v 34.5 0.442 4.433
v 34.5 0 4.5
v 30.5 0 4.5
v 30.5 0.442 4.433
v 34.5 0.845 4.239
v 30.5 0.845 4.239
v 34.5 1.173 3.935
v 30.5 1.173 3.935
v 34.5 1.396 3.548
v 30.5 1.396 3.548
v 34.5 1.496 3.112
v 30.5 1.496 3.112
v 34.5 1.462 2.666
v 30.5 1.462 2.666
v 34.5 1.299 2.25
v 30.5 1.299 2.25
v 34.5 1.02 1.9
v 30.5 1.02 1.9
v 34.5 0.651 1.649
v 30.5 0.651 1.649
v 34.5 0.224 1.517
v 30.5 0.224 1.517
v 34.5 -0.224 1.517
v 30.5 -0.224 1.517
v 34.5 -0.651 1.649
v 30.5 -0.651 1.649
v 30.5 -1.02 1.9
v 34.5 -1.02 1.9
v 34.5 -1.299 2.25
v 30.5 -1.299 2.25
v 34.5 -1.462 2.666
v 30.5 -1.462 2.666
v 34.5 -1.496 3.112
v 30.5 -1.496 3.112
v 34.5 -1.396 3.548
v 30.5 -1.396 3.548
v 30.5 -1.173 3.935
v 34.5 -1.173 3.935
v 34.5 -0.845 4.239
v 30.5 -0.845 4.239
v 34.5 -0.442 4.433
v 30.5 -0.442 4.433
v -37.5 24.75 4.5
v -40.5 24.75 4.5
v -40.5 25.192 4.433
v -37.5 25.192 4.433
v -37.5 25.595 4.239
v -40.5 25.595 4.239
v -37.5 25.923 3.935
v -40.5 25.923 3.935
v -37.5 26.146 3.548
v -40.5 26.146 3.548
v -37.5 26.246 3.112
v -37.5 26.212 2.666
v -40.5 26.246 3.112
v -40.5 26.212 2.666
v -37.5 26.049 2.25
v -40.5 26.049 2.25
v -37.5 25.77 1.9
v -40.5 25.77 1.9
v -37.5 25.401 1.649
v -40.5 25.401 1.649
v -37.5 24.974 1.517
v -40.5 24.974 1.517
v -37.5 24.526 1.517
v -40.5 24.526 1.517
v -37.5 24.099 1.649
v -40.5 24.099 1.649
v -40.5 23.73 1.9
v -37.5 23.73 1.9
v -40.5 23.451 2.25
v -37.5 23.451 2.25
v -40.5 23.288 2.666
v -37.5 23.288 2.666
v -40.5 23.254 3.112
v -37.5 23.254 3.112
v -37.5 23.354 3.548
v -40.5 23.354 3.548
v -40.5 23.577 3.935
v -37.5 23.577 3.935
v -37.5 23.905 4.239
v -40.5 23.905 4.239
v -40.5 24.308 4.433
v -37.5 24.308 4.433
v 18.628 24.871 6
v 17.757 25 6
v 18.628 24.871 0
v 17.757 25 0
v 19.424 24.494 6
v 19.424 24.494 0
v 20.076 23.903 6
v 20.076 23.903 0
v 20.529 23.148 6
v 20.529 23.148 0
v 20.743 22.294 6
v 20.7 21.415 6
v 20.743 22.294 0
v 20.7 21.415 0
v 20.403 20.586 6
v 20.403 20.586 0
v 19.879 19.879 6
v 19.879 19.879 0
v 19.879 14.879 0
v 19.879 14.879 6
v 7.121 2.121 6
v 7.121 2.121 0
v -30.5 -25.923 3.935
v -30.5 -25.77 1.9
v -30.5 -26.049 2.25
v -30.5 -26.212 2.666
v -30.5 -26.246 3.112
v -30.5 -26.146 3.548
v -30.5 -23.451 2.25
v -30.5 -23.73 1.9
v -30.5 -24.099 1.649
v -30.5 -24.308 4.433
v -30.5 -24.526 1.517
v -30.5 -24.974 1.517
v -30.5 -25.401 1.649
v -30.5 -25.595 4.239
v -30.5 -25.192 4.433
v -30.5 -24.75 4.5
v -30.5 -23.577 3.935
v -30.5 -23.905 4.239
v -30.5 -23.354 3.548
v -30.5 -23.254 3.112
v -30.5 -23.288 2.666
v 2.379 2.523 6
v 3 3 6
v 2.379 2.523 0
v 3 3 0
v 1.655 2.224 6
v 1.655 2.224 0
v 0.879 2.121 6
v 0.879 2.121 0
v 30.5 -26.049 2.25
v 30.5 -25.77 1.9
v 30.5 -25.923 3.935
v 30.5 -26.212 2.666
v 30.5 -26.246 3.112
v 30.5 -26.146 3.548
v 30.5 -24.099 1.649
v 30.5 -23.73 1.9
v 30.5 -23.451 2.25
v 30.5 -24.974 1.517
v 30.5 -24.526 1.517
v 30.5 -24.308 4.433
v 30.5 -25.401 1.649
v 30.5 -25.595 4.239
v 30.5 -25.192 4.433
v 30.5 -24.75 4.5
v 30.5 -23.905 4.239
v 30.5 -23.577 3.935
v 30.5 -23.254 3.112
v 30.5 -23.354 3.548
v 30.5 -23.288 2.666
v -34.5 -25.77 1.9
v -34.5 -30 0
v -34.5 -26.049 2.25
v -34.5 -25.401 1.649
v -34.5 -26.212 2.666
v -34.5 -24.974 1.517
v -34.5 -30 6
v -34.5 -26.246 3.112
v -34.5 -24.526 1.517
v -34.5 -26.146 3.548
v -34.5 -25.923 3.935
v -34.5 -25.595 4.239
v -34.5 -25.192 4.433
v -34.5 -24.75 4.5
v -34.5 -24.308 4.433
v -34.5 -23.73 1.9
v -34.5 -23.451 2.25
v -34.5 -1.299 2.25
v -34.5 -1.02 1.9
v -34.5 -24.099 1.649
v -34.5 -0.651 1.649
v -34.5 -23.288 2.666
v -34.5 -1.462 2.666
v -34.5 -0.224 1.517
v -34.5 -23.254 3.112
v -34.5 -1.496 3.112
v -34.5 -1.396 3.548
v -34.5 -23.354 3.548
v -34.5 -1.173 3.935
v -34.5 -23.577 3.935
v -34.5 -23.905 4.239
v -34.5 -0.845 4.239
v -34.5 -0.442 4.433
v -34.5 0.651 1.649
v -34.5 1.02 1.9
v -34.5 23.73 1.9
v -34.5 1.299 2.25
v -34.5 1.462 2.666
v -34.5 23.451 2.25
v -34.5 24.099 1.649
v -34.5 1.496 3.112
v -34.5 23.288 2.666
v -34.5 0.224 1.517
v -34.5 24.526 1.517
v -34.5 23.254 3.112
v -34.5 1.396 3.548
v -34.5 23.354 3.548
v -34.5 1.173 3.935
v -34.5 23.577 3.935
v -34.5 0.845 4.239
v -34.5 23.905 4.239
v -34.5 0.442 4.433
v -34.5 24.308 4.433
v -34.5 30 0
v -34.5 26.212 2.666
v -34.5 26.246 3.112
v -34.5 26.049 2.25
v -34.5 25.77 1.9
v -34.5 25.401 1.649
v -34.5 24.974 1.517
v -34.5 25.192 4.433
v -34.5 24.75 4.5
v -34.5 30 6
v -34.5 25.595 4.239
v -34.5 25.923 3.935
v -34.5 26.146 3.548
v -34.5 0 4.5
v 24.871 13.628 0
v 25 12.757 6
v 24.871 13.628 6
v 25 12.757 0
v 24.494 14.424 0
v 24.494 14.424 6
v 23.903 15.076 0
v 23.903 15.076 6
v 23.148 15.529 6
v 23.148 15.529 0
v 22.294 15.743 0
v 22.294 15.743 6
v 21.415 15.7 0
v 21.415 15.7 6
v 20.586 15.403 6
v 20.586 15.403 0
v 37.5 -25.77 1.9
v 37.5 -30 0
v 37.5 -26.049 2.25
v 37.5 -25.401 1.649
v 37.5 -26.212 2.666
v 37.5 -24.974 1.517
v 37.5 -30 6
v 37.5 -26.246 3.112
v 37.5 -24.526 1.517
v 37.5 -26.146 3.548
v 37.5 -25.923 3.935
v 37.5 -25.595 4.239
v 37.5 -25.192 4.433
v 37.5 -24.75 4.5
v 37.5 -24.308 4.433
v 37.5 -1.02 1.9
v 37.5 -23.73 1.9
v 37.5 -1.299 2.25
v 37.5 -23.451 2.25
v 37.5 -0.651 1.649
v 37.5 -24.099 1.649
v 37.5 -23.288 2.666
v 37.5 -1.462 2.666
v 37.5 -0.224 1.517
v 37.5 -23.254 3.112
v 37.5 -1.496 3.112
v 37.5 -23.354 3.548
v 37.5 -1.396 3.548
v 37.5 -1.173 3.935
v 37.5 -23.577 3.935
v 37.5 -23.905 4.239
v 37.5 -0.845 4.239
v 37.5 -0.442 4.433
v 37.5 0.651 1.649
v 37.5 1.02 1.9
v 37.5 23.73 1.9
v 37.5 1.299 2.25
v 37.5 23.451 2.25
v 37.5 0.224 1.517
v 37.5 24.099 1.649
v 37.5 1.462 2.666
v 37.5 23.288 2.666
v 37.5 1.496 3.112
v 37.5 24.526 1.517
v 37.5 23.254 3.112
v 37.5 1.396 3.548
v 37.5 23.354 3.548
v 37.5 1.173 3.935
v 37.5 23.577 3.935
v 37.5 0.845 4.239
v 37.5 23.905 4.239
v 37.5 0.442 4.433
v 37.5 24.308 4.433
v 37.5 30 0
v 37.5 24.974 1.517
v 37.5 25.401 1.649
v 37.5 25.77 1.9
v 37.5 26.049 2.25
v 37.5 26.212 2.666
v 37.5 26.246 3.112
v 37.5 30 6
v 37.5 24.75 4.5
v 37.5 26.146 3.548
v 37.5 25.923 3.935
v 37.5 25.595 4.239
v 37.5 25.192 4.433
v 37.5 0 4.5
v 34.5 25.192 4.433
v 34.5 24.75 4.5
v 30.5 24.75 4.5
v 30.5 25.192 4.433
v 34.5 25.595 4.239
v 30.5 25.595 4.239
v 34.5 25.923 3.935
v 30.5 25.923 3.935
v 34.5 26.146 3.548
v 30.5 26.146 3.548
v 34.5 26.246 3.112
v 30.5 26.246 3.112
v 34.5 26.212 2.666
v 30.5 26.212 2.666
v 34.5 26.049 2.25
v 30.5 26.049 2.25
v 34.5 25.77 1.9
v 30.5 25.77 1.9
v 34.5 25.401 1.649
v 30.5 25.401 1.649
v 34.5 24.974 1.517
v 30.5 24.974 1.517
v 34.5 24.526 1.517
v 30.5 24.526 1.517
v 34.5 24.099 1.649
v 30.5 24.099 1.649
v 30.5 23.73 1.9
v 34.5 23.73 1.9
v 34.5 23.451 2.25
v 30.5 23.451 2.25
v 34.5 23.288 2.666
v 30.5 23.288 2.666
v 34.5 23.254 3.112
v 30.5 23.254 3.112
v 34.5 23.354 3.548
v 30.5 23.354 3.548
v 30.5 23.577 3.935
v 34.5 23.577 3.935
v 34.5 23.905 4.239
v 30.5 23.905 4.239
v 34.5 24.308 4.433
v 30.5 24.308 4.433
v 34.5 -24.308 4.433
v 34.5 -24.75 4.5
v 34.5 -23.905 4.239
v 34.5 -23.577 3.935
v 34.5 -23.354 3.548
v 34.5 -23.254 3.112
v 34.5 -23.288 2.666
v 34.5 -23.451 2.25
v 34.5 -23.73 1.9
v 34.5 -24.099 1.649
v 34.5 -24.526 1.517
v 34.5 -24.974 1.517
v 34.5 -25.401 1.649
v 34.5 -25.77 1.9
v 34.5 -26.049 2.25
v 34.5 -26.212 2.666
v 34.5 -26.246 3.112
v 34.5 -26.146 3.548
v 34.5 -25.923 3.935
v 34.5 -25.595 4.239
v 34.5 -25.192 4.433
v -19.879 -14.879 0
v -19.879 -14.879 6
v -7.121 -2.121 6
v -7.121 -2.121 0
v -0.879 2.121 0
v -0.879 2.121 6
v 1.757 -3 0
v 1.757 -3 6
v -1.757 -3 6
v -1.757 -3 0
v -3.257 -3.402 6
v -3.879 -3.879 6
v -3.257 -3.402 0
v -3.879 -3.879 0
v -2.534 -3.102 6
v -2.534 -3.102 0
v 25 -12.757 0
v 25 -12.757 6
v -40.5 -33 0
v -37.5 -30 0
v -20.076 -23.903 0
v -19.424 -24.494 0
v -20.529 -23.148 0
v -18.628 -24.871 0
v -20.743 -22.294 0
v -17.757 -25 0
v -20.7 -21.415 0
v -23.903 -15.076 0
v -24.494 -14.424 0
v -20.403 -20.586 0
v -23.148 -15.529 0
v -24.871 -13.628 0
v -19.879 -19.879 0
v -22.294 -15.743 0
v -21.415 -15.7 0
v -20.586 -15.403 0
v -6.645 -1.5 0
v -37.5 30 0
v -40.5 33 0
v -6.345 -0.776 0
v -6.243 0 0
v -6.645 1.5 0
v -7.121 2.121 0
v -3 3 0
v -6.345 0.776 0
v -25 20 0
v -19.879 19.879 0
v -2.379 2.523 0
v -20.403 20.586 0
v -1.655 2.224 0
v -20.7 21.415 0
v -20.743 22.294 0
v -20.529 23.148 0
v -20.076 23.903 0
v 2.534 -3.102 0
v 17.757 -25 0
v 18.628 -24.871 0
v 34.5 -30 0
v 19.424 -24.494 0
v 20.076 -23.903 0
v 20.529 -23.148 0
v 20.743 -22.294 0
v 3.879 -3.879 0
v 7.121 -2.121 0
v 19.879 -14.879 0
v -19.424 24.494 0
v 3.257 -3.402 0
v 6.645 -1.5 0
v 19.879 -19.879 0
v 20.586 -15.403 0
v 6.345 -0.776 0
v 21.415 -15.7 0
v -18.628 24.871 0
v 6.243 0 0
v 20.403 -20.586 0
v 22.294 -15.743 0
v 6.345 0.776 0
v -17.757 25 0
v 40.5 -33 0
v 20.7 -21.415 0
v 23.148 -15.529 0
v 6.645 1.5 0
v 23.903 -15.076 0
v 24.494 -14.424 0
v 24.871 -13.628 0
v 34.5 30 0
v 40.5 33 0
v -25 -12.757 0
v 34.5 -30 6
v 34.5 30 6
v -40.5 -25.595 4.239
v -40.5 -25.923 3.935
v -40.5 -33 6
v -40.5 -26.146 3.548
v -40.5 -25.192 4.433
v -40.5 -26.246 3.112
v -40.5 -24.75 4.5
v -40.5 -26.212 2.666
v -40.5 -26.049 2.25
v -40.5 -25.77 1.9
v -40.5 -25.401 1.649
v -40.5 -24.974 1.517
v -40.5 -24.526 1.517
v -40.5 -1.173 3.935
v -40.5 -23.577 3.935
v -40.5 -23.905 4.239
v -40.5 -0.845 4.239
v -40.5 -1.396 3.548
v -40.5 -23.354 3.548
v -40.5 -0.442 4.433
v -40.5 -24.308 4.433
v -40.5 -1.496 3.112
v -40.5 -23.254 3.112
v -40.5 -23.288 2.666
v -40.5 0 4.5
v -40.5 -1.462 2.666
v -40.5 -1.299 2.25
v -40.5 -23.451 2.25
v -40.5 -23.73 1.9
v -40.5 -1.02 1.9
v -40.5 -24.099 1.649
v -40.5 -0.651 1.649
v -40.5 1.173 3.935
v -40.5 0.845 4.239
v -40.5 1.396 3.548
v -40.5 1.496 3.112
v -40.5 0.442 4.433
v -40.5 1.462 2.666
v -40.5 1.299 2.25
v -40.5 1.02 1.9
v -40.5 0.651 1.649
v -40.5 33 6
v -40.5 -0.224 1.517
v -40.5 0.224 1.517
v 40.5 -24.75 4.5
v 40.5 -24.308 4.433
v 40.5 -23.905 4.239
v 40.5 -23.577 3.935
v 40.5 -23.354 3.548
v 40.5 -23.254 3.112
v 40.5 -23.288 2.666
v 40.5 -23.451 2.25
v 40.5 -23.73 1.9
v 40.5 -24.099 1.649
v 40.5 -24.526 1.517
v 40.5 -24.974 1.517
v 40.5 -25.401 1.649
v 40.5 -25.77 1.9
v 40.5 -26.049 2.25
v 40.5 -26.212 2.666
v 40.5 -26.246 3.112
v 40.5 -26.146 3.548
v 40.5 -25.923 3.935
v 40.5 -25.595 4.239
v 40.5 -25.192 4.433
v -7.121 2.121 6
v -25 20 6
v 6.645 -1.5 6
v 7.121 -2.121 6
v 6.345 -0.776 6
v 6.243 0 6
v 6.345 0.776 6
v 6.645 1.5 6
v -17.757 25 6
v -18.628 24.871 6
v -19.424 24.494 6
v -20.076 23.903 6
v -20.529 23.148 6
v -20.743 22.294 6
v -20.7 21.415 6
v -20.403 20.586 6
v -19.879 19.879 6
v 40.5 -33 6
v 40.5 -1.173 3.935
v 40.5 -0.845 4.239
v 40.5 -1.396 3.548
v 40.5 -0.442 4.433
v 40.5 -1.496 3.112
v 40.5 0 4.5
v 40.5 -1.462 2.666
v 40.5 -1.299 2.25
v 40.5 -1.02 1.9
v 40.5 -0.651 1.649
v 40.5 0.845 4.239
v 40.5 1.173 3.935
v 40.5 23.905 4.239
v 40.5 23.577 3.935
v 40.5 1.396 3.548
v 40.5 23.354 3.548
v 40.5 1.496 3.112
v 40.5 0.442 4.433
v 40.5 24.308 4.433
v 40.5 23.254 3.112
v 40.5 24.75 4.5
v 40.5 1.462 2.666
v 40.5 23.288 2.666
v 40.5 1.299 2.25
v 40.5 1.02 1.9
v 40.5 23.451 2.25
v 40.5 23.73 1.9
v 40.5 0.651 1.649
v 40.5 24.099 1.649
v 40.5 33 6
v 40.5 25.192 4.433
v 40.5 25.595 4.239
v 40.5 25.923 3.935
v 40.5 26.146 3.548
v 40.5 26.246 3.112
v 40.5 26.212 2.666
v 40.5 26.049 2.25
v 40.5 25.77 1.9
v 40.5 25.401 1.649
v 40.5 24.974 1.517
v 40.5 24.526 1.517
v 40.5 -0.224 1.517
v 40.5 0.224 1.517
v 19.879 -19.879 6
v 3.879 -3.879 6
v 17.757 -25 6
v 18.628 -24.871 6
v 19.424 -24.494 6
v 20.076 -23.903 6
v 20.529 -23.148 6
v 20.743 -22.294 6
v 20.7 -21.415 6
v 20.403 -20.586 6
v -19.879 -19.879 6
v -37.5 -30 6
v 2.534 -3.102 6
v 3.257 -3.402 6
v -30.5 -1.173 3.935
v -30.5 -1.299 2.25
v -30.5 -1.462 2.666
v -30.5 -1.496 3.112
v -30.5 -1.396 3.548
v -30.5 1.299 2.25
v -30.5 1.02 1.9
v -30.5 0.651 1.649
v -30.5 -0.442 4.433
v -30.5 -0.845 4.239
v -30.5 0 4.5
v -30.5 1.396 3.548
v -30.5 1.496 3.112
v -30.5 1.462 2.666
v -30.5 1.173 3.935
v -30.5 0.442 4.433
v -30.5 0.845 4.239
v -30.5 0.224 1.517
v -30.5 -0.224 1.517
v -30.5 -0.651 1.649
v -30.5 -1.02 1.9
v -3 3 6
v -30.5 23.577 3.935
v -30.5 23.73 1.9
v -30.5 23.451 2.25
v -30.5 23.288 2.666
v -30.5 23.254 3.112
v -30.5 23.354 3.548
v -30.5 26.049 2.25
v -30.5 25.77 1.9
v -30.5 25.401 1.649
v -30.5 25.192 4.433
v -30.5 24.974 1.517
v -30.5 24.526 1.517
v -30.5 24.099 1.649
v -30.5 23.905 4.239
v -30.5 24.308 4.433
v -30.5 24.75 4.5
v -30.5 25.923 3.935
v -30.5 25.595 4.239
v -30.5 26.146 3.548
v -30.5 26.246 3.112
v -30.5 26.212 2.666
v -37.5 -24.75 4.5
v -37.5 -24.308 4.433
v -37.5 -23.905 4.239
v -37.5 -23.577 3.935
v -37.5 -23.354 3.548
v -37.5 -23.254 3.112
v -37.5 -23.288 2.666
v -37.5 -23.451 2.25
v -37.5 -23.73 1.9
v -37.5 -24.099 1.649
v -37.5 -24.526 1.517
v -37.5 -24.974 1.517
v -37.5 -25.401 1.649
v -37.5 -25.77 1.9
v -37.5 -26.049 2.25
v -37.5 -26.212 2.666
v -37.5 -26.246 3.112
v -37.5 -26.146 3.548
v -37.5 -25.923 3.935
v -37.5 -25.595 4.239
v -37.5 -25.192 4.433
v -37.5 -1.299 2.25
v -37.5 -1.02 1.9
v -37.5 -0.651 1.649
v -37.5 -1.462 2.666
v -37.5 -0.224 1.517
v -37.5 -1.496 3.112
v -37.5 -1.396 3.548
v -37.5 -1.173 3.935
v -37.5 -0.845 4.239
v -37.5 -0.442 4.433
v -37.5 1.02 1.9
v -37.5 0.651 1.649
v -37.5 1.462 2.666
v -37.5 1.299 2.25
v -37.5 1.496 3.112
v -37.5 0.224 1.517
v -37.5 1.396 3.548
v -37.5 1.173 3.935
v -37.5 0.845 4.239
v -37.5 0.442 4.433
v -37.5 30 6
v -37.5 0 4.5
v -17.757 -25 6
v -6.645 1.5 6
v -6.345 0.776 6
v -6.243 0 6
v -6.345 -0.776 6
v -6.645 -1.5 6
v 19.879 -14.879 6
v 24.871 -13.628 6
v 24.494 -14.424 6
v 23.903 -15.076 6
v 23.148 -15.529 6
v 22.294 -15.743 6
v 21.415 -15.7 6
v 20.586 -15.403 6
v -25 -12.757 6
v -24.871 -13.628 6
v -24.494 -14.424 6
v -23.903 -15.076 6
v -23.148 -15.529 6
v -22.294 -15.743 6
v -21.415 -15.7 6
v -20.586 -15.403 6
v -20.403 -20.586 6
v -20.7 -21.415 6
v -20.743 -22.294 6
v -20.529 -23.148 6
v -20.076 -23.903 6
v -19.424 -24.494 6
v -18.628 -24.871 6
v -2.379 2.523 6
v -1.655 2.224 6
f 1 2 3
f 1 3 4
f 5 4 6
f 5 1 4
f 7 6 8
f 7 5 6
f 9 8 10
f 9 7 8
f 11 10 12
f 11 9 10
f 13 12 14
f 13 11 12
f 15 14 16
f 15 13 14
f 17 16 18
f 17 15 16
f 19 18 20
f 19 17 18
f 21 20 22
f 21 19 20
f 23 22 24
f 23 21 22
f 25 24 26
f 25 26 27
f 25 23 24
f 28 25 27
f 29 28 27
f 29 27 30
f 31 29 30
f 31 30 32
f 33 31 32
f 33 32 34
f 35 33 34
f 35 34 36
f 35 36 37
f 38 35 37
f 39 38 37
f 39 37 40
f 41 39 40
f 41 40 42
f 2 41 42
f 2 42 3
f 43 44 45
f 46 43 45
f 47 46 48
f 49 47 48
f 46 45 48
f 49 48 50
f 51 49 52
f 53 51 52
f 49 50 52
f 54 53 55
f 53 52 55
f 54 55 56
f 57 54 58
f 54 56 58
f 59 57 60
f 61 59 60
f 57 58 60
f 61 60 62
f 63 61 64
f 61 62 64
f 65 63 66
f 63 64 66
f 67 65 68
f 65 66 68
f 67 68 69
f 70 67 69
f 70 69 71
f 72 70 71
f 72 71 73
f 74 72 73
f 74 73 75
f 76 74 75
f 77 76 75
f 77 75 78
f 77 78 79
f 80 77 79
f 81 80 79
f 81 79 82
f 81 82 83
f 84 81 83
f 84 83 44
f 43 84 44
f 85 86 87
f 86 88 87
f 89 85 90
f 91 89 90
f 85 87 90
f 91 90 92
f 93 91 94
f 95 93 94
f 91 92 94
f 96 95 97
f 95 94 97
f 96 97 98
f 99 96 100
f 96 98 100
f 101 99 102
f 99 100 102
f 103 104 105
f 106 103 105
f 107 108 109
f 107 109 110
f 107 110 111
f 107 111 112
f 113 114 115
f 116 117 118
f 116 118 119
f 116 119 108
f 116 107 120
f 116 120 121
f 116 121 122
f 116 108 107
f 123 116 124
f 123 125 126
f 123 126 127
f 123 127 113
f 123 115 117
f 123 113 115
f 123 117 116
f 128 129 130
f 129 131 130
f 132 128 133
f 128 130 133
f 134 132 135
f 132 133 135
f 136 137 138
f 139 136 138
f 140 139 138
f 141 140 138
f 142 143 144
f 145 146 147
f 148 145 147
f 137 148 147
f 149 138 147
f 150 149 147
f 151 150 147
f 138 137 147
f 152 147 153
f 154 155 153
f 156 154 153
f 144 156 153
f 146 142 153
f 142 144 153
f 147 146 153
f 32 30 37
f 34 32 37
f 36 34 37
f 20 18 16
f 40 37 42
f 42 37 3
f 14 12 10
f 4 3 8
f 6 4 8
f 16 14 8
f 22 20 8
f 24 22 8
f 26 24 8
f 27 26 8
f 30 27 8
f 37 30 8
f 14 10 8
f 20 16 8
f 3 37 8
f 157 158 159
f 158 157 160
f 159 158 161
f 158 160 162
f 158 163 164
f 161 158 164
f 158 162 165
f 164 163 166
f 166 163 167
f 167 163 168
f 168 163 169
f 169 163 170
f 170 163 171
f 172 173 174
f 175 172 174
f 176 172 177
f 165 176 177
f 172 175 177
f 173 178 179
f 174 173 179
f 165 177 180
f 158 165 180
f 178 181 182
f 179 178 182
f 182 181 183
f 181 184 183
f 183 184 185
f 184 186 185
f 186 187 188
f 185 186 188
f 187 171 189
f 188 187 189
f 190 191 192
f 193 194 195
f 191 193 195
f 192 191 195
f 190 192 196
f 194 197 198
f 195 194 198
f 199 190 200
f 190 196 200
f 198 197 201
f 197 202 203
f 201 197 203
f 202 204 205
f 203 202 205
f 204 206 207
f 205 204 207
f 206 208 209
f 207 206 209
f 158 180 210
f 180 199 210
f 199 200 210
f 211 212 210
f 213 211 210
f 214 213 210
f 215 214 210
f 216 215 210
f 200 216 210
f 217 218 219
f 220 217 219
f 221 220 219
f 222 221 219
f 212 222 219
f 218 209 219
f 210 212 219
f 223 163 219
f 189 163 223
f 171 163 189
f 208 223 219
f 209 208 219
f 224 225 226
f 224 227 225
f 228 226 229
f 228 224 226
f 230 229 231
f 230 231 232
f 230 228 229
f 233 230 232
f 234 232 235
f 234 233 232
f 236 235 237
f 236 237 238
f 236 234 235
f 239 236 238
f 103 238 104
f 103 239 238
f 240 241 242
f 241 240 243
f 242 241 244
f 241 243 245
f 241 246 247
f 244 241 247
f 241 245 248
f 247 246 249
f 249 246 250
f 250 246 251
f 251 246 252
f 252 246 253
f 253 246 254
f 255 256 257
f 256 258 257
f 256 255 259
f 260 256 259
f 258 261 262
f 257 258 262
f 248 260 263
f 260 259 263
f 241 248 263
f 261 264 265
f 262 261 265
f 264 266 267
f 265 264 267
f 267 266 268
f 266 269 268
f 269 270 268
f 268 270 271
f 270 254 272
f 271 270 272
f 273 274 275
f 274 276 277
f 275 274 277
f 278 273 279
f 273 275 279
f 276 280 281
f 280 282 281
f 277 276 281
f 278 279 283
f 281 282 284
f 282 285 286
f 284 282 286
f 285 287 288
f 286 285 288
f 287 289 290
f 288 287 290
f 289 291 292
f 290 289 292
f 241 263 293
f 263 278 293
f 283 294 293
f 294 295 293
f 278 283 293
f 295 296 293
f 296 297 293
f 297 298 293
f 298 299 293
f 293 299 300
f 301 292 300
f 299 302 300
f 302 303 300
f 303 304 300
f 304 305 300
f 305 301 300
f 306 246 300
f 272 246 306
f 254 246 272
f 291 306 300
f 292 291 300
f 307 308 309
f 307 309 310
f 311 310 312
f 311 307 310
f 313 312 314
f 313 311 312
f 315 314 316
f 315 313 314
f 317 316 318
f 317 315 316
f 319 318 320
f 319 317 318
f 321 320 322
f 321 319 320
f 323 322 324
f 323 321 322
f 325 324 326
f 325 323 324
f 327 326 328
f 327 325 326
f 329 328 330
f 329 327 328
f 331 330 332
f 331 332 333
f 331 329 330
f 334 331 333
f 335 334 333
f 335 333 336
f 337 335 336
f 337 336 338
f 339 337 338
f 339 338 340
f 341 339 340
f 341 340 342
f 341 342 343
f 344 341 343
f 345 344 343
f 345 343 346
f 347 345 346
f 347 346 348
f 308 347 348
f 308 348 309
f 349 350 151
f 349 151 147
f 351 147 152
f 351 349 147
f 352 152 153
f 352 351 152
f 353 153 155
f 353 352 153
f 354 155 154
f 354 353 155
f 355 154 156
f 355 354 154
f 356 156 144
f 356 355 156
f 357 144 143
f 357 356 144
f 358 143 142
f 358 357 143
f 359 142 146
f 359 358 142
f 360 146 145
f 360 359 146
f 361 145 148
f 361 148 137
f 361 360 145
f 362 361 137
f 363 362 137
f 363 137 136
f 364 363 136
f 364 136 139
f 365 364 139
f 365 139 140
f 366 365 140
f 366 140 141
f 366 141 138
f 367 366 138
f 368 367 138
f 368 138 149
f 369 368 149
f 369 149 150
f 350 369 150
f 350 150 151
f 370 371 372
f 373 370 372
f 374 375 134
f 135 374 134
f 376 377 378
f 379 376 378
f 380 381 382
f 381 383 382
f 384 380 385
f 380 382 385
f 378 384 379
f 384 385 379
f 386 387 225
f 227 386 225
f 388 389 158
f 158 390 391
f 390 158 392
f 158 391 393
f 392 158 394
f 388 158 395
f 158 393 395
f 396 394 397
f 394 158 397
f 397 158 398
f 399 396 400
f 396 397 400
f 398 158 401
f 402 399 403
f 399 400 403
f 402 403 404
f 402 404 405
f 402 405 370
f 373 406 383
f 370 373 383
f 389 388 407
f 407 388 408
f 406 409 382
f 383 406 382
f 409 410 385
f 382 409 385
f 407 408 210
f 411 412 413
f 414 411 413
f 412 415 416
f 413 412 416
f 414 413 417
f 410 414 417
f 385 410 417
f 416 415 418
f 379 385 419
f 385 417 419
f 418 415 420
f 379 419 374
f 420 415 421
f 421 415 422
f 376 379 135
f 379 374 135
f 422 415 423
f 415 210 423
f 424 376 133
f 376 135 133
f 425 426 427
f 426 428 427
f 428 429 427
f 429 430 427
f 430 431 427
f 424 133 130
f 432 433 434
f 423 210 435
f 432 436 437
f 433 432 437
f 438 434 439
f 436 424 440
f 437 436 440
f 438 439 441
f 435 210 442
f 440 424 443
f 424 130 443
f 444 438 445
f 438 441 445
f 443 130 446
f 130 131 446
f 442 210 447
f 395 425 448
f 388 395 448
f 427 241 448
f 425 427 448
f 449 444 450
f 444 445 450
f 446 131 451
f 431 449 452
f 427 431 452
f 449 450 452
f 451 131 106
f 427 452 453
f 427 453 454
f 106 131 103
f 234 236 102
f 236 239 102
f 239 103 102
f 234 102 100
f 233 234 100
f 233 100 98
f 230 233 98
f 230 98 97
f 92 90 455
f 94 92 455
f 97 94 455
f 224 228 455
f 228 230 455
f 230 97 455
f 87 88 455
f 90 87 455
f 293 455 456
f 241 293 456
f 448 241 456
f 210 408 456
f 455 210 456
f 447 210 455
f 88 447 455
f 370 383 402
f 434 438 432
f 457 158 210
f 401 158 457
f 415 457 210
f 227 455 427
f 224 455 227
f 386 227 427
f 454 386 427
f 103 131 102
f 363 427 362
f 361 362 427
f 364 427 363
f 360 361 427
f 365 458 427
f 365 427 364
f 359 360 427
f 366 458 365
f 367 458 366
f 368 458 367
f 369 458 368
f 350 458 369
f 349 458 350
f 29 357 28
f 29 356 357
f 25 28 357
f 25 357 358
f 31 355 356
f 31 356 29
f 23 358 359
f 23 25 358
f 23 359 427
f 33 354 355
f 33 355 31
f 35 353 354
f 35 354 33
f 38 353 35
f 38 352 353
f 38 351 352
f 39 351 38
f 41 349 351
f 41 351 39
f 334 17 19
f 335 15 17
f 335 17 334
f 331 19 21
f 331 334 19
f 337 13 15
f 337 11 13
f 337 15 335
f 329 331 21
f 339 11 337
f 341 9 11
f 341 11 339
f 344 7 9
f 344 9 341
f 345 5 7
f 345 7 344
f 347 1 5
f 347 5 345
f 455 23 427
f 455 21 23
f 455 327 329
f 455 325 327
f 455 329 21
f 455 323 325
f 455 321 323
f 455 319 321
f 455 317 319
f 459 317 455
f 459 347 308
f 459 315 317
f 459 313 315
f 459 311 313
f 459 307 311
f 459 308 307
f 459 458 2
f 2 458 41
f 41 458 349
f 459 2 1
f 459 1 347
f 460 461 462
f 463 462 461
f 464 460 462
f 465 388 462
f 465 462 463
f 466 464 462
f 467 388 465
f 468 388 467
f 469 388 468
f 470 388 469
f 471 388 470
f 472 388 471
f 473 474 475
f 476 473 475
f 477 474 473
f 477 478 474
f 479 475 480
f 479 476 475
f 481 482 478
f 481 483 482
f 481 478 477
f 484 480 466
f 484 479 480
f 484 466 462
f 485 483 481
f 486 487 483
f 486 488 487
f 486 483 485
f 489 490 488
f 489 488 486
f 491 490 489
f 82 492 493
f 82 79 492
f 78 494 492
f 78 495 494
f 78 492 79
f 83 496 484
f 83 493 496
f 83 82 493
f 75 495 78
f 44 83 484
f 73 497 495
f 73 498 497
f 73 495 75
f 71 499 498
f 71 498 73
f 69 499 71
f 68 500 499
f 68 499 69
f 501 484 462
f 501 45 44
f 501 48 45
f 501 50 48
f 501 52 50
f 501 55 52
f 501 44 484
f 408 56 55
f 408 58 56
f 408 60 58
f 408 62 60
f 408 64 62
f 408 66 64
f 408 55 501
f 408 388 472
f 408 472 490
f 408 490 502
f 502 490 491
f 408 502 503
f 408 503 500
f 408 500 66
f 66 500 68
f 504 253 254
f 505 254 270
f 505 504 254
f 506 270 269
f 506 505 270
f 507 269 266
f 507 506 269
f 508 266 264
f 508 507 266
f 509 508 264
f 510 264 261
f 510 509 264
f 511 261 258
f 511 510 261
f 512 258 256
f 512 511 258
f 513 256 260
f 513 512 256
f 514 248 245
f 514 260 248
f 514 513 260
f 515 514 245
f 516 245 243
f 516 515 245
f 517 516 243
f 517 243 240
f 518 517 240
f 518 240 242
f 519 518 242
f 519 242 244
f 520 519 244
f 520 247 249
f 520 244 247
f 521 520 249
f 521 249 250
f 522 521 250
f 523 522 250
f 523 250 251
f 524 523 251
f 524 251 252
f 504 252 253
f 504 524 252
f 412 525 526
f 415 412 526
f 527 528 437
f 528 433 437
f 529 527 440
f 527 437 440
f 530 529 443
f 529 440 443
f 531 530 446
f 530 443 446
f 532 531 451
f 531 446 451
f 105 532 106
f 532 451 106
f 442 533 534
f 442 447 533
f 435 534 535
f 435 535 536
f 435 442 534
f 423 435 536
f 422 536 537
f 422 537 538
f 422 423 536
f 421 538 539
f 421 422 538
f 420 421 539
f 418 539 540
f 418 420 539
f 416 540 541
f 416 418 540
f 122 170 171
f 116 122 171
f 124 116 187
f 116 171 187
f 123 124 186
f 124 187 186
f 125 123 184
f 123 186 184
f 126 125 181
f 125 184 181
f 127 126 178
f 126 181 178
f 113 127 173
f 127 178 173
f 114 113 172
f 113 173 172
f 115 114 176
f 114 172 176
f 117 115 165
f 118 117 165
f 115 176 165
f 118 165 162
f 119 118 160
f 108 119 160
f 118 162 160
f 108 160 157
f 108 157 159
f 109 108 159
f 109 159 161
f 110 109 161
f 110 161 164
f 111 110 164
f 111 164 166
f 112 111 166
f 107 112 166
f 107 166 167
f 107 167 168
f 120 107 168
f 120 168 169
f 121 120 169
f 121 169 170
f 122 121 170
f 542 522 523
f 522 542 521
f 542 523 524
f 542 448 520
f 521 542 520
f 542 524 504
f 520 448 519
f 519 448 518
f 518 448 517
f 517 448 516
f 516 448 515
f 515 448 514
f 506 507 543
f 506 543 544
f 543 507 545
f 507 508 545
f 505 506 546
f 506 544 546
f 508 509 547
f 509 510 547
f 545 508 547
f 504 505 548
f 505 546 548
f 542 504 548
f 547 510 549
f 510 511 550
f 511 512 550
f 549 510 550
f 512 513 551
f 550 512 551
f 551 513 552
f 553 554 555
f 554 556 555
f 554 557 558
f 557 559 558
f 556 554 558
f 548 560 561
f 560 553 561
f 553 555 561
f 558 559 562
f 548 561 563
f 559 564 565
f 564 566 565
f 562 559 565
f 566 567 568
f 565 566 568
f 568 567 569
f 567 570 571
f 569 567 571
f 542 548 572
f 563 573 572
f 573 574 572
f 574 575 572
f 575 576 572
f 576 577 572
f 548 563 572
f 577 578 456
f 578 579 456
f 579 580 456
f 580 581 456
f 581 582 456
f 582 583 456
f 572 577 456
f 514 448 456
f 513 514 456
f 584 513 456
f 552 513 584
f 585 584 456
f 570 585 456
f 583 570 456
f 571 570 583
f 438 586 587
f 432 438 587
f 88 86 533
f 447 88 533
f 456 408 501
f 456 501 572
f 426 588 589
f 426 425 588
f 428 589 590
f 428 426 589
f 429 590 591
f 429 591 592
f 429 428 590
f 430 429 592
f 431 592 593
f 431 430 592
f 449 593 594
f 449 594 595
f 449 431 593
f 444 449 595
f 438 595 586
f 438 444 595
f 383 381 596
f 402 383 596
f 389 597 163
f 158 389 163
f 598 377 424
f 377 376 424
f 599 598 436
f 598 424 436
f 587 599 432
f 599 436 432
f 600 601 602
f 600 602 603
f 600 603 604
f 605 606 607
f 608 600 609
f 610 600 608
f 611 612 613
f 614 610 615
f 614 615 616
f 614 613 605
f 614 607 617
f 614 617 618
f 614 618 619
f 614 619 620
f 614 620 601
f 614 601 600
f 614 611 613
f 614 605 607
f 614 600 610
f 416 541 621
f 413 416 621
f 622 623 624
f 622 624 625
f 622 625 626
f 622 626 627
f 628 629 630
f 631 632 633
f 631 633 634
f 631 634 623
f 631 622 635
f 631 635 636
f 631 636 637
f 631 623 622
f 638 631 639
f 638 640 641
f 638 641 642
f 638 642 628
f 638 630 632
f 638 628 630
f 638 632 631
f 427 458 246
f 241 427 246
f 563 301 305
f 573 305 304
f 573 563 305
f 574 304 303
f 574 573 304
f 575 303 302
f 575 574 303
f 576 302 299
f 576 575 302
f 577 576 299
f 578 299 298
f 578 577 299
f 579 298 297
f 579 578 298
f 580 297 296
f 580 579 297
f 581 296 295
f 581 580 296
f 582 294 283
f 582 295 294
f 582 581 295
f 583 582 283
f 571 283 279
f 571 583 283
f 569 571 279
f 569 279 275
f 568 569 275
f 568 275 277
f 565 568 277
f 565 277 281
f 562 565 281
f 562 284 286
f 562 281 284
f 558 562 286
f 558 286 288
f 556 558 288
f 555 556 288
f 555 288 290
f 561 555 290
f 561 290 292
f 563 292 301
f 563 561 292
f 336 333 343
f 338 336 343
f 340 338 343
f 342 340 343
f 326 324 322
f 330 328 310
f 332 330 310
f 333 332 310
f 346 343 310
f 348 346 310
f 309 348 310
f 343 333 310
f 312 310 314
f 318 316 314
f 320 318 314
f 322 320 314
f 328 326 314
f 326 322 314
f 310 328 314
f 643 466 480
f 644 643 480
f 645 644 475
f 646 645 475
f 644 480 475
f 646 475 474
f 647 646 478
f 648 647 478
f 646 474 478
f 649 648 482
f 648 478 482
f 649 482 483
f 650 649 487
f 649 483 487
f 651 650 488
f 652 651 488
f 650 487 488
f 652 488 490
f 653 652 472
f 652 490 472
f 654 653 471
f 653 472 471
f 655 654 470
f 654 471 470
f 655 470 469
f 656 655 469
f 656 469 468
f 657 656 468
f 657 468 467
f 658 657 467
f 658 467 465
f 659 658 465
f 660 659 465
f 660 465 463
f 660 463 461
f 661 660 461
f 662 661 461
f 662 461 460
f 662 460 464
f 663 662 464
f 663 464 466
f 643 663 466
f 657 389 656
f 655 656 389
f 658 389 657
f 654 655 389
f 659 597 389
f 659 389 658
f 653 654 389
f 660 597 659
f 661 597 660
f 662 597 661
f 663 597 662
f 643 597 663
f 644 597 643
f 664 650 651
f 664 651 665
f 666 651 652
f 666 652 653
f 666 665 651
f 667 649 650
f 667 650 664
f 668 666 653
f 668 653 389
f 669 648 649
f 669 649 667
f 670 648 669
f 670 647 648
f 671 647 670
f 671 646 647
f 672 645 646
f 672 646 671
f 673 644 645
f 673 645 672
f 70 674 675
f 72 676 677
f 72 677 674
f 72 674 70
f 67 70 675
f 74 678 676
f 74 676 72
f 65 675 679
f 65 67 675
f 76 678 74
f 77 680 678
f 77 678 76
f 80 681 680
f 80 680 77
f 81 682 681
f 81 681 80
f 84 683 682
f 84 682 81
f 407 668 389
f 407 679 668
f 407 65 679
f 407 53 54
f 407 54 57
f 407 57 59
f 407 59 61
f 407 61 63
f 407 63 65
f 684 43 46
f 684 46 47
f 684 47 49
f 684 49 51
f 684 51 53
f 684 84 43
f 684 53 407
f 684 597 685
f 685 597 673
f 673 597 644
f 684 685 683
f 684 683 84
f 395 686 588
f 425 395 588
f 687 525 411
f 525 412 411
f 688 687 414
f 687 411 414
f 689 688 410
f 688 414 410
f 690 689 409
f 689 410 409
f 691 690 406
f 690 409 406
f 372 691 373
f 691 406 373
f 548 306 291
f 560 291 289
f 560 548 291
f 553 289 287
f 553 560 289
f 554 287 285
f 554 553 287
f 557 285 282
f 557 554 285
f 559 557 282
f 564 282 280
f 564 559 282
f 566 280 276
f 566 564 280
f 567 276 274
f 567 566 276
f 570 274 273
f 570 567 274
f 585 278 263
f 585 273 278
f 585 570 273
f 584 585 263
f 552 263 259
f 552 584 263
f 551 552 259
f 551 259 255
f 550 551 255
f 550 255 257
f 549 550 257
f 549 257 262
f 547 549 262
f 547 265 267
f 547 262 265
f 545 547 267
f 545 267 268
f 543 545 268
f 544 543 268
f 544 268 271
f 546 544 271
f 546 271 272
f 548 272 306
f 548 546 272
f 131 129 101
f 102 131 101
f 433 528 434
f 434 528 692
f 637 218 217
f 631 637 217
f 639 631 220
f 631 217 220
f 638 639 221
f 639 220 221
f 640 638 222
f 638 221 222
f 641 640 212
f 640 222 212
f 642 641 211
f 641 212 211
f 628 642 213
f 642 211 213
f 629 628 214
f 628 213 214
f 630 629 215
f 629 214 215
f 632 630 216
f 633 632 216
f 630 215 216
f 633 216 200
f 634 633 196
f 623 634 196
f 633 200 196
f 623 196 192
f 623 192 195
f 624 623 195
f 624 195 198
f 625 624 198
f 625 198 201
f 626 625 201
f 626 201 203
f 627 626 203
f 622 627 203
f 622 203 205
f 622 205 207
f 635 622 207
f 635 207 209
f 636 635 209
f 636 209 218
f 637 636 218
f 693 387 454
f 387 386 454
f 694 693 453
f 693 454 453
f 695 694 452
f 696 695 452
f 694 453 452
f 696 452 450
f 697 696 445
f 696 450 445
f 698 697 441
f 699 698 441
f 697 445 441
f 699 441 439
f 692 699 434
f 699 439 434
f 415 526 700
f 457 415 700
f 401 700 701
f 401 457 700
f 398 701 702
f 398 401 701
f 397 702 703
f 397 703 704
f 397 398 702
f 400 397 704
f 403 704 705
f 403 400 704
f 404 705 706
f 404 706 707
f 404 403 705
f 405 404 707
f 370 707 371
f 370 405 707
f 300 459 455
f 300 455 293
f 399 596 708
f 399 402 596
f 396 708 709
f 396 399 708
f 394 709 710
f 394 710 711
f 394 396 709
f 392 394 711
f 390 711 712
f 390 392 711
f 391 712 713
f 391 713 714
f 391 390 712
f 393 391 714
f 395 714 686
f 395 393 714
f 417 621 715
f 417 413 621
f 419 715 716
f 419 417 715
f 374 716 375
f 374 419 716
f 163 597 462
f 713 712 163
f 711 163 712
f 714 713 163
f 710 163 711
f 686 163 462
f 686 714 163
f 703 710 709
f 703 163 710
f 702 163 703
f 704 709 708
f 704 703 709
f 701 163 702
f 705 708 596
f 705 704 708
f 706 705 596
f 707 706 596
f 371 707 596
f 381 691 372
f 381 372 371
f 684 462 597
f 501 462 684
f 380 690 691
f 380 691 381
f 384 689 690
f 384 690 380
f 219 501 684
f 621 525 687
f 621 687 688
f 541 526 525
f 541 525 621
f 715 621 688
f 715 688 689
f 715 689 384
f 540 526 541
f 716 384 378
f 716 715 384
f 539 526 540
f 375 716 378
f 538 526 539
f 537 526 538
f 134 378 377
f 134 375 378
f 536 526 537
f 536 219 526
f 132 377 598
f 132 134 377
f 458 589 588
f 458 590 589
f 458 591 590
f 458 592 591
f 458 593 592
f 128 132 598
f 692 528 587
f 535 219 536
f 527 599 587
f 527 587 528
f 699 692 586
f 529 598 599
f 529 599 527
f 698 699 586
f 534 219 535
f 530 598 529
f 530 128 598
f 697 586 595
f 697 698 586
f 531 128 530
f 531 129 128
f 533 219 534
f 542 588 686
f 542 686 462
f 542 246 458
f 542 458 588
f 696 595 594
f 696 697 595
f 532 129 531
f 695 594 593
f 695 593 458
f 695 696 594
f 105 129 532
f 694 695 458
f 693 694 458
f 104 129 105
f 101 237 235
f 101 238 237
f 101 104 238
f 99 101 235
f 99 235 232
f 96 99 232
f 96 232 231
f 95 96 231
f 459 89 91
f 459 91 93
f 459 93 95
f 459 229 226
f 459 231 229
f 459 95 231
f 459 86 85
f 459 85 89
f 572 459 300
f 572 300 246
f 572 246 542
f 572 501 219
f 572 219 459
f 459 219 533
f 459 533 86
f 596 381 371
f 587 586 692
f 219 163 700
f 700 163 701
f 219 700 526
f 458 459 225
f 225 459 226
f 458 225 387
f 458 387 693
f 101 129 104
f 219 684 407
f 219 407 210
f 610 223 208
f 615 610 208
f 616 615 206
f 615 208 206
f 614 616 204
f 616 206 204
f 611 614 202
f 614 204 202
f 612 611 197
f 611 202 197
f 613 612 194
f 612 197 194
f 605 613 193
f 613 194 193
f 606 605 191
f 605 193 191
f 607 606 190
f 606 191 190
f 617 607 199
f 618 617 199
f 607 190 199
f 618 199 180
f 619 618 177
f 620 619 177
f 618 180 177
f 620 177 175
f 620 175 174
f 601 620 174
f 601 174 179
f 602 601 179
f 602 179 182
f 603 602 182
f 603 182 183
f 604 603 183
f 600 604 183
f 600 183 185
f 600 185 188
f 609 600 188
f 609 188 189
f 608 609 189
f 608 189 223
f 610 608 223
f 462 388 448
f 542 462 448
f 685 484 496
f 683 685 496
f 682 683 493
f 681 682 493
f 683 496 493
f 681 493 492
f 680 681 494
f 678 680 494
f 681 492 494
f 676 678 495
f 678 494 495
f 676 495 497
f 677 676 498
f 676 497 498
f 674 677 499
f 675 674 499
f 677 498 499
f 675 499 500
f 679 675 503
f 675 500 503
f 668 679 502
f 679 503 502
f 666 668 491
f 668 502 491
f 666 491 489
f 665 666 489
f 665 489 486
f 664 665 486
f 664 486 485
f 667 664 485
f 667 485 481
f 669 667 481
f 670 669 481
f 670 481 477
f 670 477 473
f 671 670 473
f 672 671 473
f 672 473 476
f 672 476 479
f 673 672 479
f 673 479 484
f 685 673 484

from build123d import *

# Parameters (mm, degrees)
SKETCH1_W           = 81
SKETCH1_H           = 66
BOSS_EXTRUDE1_DEPTH = 6
SKETCH3_W           = 3
SKETCH3_H           = 60
CUT_EXTRUDE2_DEPTH  = 7
CUT_EXTRUDE5_DEPTH  = 7
FILLET2_R           = 3
FILLET3_R           = 3
SKETCH6_R           = 1.5
CUT_EXTRUDE6_DEPTH  = 10


with BuildPart() as part:
    # Sketch1 → Boss-Extrude1 (new body)
    with BuildSketch(Plane.XY):
        Rectangle(SKETCH1_W, SKETCH1_H)
    extrude(amount=BOSS_EXTRUDE1_DEPTH)

    # Sketch3 → Cut-Extrude2 (cut, through all)
    with BuildSketch(Plane.XY.offset(6)):
        with Locations((-36, 0)):
            Rectangle(SKETCH3_W, SKETCH3_H)
        with Locations((36, 0)):
            Rectangle(SKETCH3_W, SKETCH3_H)
    extrude(amount=-CUT_EXTRUDE2_DEPTH, mode=Mode.SUBTRACT)

    # Sketch5 → Cut-Extrude5 (cut, through all)
    with BuildSketch(Plane.XY.offset(6)):
        Polygon((-5, 0), (-25, 20), (-25, -20), align=None)
        Polygon((-3, -3), (-25, -25), (0, -25), (0, -3), align=None)
        Polygon((0, -3), (0, -25), (25, -25), (3, -3), align=None)
        Polygon((25, -20), (25, 20), (5, 0), align=None)
        Polygon((25, 25), (0, 25), (0, 2.121320344), (2.121320344, 2.121320344), align=None)
        Polygon((0, 25), (-25, 25), (-2.121320344, 2.121320344), (0, 2.121320344), align=None)
    extrude(amount=-CUT_EXTRUDE5_DEPTH, mode=Mode.SUBTRACT)

    # Fillet2
    fillet2_edges = [part.edges().sort_by_distance(p)[0] for p in [
        (25, 20, 3),
        (25, -20, 3),
        (25, -25, 3),
        (-25, -25, 3),
        (-25, 25, 3),
        (25, 25, 3),
        (-25, -20, 3),
    ]]
    fillet(fillet2_edges, radius=FILLET2_R)

    # Fillet3
    fillet3_edges = [part.edges().sort_by_distance(p)[0] for p in [
        (5, 0, 3),
        (-3, -3, 3),
        (3, -3, 3),
        (2.121320344, 2.121320344, 3),
        (-2.121320344, 2.121320344, 3),
        (-5, 0, 3),
    ]]
    fillet(fillet3_edges, radius=FILLET3_R)

    # Sketch6 → Cut-Extrude6 (cut)
    with BuildSketch(Plane.ZY.offset(40.5)):
        with Locations((3, 24.75)):
            Circle(SKETCH6_R)
        with Locations((3, 0)):
            Circle(SKETCH6_R)
        with Locations((3, -24.75)):
            Circle(SKETCH6_R)
    cut_extrude6 = extrude(amount=-CUT_EXTRUDE6_DEPTH, mode=Mode.SUBTRACT)

    # Mirror1: Cut-Extrude6 across plane
    add(cut_extrude6.mirror(Plane(origin=(0, 0, 0), x_dir=(0, 0, 1), z_dir=(1, 0, 0))), mode=Mode.SUBTRACT)


solid = part.part
